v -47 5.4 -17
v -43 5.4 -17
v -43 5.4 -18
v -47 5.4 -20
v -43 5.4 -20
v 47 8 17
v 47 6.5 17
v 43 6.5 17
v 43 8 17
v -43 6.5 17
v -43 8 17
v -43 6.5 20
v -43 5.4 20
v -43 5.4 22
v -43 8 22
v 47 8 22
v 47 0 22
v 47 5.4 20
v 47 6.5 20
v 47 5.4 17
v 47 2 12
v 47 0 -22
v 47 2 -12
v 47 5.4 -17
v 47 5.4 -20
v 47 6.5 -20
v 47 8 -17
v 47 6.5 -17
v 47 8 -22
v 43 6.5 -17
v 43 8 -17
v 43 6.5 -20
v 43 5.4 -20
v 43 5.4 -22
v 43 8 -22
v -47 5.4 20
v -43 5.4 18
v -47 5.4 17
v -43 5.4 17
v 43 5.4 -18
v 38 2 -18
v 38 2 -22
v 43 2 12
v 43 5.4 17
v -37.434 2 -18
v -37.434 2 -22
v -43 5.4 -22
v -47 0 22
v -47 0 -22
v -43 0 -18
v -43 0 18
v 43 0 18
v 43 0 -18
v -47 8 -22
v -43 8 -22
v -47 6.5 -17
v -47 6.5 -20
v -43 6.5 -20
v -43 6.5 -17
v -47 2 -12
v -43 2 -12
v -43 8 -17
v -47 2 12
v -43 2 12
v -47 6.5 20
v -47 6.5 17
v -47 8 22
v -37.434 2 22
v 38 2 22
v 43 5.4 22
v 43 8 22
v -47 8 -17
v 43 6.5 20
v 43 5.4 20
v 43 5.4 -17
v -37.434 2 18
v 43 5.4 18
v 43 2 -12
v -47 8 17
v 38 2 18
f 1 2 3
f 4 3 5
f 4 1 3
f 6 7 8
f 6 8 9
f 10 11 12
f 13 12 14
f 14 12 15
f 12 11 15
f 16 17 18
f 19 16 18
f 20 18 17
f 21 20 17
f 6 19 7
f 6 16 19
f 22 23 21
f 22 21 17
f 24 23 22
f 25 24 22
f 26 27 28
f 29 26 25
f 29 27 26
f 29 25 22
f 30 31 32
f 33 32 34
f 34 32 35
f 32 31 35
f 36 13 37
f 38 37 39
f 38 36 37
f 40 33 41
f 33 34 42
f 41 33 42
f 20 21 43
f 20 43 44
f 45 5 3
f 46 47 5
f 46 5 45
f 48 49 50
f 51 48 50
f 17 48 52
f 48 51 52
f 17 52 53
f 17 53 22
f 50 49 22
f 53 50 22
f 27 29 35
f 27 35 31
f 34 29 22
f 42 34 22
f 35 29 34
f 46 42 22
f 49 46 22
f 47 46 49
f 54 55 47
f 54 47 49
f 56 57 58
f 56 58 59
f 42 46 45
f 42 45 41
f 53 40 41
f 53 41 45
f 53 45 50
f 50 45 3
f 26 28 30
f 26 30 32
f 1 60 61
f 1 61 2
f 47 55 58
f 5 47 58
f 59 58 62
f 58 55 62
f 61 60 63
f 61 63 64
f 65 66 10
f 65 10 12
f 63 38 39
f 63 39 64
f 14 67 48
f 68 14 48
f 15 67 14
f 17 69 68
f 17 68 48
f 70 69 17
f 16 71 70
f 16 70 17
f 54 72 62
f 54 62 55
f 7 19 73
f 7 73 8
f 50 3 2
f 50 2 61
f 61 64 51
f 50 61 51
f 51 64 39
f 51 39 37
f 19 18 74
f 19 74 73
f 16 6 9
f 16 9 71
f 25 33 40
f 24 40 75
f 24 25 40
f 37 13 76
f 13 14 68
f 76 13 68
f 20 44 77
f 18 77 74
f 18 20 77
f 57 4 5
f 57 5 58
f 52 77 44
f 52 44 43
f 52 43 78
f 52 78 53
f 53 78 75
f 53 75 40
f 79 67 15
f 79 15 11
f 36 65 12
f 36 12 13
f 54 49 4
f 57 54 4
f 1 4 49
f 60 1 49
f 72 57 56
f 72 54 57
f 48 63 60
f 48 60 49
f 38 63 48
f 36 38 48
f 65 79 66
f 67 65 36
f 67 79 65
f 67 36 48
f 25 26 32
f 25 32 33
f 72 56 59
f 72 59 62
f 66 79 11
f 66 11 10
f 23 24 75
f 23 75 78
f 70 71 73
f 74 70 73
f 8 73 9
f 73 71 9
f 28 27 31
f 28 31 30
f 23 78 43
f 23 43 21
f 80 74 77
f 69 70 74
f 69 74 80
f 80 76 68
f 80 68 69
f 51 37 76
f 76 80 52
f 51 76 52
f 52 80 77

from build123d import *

# Parameters (mm, degrees)
SKETCH_1_W       = 94
SKETCH_1_H       = 44
SKETCH_1_W_2     = 86
SKETCH_1_H_2     = 36
EXTRUDE_2_DEPTH  = 2
EXTRUDE_3_DEPTH  = 4
EXTRUDE_4_DEPTH  = 4
EXTRUDE_5_DEPTH  = 4
EXTRUDE_6_DEPTH  = 4
EXTRUDE_7_DEPTH  = 4
EXTRUDE_8_DEPTH  = 4
EXTRUDE_9_DEPTH  = 4
EXTRUDE_10_DEPTH = 4


with BuildPart() as part:
    # Эскиз1 → Бобышка-Вытянуть2 (new body)
    with BuildSketch(Plane(origin=(0, 0, 0), x_dir=(1, 0, 0), z_dir=(0, 1, 0))):
        Rectangle(SKETCH_1_W, SKETCH_1_H)
        Rectangle(SKETCH_1_W_2, SKETCH_1_H_2, mode=Mode.SUBTRACT)
    extrude(amount=EXTRUDE_2_DEPTH)

    # Эскиз2 → Бобышка-Вытянуть3 (add)
    with BuildSketch(Plane(origin=(47, 0, 0), x_dir=(0, 0, -1), z_dir=(1, 0, 0))):
        Polygon((-22, 8), (-22, 2), (-17, 2), (-17, 5.4), (-20, 5.4), (-20, 6.5), (-17, 6.5), (-17, 8), align=None)
        Polygon((-17, 5.4), (-17, 2), (-12, 2), align=None)
    extrude(amount=-EXTRUDE_3_DEPTH)

    # Эскиз3 → Бобышка-Вытянуть4 (add)
    with BuildSketch(Plane(origin=(47, 0, 0), x_dir=(0, 0, -1), z_dir=(1, 0, 0))):
        Polygon((17, 2), (22, 2), (22, 8), (17, 8), (17, 6.5), (20, 6.5), (20, 5.4), (17, 5.4), align=None)
        Polygon((12, 2), (17, 2), (17, 5.4), align=None)
    extrude(amount=-EXTRUDE_4_DEPTH)

    # Эскиз4 → Бобышка-Вытянуть5 (add)
    with BuildSketch(Plane.ZY.offset(47)):
        Polygon((-22, 8), (-22, 2), (-17, 2), (-17, 5.4), (-20, 5.4), (-20, 6.5), (-17, 6.5), (-17, 8), align=None)
        Polygon((-17, 5.4), (-17, 2), (-12, 2), align=None)
    extrude(amount=-EXTRUDE_5_DEPTH)

    # Эскиз5 → Бобышка-Вытянуть6 (add)
    with BuildSketch(Plane.ZY.offset(47)):
        Polygon((12, 2), (17, 2), (17, 5.4), align=None)
        Polygon((17, 2), (22, 2), (22, 8), (17, 8), (17, 6.5), (20, 6.5), (20, 5.4), (17, 5.4), align=None)
    extrude(amount=-EXTRUDE_6_DEPTH)

    # Эскиз6 → Бобышка-Вытянуть7 (add)
    with BuildSketch(Plane.XY.offset(22)):
        Polygon((-43, 2), (-43, 5.4), (-37.433571672, 2), align=None)
    extrude(amount=-EXTRUDE_7_DEPTH)

    # Эскиз7 → Бобышка-Вытянуть8 (add)
    with BuildSketch(Plane.XY.offset(22)):
        Polygon((43, 2), (43, 5.4), (38, 2), align=None)
    extrude(amount=-EXTRUDE_8_DEPTH)

    # Эскиз8 → Бобышка-Вытянуть9 (add)
    with BuildSketch(Plane(origin=(0, 0, -22), x_dir=(-1, 0, 0), z_dir=(0, 0, -1))):
        Polygon((-43, 2), (-43, 5.4), (-38, 2), align=None)
    extrude(amount=-EXTRUDE_9_DEPTH)

    # Эскиз9 → Бобышка-Вытянуть10 (add)
    with BuildSketch(Plane(origin=(0, 0, -22), x_dir=(-1, 0, 0), z_dir=(0, 0, -1))):
        Polygon((43, 2), (43, 5.4), (37.433571672, 2), align=None)
    extrude(amount=-EXTRUDE_10_DEPTH)


solid = part.part
